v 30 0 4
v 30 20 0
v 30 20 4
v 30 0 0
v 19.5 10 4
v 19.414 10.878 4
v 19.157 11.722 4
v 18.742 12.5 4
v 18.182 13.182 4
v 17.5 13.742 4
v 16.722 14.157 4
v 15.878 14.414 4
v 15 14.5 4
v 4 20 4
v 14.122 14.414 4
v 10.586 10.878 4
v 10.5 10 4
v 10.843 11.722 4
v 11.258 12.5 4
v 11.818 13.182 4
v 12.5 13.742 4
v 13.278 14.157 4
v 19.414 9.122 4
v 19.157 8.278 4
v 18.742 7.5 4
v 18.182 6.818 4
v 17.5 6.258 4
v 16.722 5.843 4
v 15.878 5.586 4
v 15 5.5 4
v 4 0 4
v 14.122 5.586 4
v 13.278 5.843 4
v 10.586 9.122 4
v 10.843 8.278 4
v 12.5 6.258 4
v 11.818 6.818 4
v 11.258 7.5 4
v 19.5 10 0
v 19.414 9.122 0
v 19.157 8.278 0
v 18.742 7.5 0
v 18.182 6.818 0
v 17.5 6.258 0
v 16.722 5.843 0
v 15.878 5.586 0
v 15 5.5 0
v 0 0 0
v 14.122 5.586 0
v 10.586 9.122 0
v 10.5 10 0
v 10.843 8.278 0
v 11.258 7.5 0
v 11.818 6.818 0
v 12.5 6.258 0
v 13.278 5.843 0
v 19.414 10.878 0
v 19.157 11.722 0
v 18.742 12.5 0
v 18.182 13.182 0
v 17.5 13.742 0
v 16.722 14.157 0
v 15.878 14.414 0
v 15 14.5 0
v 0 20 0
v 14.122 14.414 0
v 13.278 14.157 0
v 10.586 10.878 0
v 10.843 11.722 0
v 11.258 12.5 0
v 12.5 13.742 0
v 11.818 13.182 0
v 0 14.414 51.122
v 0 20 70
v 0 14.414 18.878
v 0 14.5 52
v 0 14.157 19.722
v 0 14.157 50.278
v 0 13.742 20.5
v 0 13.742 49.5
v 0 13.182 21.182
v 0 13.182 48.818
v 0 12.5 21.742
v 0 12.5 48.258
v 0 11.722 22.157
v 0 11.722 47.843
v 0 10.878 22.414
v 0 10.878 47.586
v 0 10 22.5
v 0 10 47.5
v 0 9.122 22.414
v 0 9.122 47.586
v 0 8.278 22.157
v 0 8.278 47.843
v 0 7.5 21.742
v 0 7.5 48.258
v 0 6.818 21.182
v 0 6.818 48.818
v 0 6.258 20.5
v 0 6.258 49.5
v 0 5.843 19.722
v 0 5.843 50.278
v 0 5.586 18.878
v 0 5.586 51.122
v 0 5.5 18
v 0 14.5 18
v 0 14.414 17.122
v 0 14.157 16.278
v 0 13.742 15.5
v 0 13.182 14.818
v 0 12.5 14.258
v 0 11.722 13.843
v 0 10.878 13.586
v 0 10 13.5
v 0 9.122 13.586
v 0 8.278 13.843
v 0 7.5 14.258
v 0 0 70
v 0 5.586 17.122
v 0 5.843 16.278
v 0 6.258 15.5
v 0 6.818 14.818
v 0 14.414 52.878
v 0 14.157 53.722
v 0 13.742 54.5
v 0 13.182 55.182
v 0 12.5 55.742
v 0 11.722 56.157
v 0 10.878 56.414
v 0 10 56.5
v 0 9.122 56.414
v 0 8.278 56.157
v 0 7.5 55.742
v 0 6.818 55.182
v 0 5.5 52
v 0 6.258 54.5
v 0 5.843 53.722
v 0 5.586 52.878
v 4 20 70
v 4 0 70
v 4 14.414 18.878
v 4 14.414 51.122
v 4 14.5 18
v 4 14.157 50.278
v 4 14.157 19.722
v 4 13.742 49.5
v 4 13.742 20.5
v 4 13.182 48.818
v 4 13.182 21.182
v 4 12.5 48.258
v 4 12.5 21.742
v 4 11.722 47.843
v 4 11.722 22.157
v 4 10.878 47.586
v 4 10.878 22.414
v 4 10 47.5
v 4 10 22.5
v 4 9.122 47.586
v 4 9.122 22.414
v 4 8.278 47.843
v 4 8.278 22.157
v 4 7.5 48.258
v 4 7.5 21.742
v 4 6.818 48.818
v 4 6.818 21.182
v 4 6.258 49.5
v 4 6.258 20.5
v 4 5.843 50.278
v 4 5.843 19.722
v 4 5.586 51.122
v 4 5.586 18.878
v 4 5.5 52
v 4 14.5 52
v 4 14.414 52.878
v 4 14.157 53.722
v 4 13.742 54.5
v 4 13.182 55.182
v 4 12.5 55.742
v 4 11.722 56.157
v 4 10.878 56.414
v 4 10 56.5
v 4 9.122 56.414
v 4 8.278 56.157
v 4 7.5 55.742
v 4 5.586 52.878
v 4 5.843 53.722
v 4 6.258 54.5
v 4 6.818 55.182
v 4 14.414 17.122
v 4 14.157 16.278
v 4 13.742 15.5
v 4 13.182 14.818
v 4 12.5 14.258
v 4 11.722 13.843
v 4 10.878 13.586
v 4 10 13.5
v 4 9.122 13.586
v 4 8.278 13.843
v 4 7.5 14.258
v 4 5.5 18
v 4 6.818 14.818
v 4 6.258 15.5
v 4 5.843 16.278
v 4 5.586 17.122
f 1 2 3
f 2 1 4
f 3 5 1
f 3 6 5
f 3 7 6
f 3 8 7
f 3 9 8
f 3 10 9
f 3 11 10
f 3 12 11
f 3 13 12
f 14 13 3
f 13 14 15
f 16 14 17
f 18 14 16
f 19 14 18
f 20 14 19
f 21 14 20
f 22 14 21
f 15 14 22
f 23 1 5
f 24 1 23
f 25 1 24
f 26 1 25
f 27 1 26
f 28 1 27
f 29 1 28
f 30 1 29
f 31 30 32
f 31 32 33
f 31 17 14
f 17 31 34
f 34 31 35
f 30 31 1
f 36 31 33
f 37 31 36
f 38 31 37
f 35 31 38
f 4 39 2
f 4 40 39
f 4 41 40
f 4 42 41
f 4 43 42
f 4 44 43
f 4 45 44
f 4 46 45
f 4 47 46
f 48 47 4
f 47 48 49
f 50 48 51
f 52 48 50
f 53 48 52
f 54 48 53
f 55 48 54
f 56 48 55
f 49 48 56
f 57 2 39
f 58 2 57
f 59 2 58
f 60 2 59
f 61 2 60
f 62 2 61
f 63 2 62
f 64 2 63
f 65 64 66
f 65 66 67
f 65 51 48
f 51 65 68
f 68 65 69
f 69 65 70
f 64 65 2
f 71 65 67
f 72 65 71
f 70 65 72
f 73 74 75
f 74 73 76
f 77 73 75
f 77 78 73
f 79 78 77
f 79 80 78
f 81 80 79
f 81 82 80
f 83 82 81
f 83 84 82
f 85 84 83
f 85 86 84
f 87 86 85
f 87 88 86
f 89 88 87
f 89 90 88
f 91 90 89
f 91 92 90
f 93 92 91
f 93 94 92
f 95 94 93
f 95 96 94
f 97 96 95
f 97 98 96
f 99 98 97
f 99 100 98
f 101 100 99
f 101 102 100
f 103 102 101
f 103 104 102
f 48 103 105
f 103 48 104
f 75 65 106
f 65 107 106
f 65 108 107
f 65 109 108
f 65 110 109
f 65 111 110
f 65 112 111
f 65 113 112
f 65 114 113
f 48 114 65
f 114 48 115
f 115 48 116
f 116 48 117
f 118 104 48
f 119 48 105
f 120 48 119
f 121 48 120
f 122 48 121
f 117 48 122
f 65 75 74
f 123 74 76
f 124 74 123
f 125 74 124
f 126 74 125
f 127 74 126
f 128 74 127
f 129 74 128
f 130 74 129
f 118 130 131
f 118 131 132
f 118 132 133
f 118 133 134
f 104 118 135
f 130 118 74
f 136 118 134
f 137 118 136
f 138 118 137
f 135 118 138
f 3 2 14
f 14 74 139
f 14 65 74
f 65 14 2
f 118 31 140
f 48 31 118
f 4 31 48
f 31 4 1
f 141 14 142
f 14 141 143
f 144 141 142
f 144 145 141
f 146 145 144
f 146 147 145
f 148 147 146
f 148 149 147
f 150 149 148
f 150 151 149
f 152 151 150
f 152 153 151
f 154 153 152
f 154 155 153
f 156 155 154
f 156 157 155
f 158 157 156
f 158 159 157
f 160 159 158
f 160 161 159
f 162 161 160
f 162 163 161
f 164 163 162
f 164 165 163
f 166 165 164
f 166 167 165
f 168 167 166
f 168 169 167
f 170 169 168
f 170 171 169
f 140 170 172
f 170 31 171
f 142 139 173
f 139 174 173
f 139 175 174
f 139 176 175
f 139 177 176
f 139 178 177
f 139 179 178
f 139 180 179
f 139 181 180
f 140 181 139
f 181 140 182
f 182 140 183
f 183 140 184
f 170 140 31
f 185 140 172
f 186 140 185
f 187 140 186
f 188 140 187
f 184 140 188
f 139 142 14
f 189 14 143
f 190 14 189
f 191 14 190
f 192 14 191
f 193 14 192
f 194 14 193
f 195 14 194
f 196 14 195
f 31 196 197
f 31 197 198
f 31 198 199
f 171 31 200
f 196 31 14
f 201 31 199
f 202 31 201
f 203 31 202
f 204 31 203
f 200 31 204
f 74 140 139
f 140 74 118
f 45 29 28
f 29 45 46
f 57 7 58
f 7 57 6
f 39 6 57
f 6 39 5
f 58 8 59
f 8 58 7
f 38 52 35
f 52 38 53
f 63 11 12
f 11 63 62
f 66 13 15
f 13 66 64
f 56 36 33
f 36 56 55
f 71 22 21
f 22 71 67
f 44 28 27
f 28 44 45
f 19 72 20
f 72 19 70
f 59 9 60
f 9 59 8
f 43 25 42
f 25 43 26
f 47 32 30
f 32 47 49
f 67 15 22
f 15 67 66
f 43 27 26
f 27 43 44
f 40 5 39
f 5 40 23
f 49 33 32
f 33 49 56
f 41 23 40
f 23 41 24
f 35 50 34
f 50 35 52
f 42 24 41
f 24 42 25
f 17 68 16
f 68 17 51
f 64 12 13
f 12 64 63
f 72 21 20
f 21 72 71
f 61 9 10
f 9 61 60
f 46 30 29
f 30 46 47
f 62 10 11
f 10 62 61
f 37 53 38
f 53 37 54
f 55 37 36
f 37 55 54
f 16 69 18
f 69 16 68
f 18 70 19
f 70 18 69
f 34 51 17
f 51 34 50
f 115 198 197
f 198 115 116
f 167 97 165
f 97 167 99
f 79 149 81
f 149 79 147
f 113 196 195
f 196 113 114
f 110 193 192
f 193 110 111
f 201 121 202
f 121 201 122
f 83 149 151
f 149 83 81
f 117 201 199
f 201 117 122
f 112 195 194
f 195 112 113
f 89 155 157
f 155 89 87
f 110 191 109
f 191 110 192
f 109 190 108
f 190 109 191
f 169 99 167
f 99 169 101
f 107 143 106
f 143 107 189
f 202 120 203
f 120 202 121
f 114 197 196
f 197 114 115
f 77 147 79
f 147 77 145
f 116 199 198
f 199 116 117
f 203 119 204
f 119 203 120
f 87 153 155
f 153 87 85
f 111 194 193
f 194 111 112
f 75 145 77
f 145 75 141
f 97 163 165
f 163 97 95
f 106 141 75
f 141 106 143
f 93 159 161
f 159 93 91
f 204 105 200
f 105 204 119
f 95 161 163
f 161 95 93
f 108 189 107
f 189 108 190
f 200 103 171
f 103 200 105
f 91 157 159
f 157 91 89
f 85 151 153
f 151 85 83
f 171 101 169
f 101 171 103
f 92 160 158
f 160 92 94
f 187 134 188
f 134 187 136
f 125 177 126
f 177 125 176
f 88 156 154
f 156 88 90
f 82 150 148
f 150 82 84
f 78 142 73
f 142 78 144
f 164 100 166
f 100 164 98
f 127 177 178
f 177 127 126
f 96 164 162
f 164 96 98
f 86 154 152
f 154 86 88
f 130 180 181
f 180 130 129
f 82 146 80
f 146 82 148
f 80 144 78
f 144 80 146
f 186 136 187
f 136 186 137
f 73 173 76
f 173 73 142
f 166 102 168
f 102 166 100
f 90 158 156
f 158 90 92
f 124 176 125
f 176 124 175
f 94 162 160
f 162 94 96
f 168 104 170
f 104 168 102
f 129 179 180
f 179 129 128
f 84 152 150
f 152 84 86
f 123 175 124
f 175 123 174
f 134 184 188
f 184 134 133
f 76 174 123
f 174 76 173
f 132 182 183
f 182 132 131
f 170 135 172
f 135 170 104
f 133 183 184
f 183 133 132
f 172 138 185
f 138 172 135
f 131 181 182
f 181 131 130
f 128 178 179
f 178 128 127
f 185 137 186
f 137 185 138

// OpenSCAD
$fn = 32;

// ----------------------------------------------------------------------
// L-bracket: 30 x 20 x 70 mm
// ----------------------------------------------------------------------

// --- parameters (mm) ---
arm_x = 30;               // horizontal leg, X
arm_z = 70;               // vertical leg, Z
width = 20;               // bracket depth, Y
wall = 4;                 // plate thickness
hole_d = 9;               // clearance for M8

module hole_z(px, py) {
  translate([px, py, -0.5]) cylinder(h = wall + 1, d = hole_d);
}
module hole_x(pz, py) {
  translate([-0.5, py, pz]) rotate([0, 90, 0]) cylinder(h = wall + 1, d = hole_d);
}

difference() {
  union() {
    /* horizontal leg */
    cube([arm_x, width, wall]);
    /* vertical leg, overlapping the corner block */
    cube([wall, width, arm_z]);
  }
  hole_z(15, 10);
  hole_x(18, 10);
  hole_x(52, 10);
}
